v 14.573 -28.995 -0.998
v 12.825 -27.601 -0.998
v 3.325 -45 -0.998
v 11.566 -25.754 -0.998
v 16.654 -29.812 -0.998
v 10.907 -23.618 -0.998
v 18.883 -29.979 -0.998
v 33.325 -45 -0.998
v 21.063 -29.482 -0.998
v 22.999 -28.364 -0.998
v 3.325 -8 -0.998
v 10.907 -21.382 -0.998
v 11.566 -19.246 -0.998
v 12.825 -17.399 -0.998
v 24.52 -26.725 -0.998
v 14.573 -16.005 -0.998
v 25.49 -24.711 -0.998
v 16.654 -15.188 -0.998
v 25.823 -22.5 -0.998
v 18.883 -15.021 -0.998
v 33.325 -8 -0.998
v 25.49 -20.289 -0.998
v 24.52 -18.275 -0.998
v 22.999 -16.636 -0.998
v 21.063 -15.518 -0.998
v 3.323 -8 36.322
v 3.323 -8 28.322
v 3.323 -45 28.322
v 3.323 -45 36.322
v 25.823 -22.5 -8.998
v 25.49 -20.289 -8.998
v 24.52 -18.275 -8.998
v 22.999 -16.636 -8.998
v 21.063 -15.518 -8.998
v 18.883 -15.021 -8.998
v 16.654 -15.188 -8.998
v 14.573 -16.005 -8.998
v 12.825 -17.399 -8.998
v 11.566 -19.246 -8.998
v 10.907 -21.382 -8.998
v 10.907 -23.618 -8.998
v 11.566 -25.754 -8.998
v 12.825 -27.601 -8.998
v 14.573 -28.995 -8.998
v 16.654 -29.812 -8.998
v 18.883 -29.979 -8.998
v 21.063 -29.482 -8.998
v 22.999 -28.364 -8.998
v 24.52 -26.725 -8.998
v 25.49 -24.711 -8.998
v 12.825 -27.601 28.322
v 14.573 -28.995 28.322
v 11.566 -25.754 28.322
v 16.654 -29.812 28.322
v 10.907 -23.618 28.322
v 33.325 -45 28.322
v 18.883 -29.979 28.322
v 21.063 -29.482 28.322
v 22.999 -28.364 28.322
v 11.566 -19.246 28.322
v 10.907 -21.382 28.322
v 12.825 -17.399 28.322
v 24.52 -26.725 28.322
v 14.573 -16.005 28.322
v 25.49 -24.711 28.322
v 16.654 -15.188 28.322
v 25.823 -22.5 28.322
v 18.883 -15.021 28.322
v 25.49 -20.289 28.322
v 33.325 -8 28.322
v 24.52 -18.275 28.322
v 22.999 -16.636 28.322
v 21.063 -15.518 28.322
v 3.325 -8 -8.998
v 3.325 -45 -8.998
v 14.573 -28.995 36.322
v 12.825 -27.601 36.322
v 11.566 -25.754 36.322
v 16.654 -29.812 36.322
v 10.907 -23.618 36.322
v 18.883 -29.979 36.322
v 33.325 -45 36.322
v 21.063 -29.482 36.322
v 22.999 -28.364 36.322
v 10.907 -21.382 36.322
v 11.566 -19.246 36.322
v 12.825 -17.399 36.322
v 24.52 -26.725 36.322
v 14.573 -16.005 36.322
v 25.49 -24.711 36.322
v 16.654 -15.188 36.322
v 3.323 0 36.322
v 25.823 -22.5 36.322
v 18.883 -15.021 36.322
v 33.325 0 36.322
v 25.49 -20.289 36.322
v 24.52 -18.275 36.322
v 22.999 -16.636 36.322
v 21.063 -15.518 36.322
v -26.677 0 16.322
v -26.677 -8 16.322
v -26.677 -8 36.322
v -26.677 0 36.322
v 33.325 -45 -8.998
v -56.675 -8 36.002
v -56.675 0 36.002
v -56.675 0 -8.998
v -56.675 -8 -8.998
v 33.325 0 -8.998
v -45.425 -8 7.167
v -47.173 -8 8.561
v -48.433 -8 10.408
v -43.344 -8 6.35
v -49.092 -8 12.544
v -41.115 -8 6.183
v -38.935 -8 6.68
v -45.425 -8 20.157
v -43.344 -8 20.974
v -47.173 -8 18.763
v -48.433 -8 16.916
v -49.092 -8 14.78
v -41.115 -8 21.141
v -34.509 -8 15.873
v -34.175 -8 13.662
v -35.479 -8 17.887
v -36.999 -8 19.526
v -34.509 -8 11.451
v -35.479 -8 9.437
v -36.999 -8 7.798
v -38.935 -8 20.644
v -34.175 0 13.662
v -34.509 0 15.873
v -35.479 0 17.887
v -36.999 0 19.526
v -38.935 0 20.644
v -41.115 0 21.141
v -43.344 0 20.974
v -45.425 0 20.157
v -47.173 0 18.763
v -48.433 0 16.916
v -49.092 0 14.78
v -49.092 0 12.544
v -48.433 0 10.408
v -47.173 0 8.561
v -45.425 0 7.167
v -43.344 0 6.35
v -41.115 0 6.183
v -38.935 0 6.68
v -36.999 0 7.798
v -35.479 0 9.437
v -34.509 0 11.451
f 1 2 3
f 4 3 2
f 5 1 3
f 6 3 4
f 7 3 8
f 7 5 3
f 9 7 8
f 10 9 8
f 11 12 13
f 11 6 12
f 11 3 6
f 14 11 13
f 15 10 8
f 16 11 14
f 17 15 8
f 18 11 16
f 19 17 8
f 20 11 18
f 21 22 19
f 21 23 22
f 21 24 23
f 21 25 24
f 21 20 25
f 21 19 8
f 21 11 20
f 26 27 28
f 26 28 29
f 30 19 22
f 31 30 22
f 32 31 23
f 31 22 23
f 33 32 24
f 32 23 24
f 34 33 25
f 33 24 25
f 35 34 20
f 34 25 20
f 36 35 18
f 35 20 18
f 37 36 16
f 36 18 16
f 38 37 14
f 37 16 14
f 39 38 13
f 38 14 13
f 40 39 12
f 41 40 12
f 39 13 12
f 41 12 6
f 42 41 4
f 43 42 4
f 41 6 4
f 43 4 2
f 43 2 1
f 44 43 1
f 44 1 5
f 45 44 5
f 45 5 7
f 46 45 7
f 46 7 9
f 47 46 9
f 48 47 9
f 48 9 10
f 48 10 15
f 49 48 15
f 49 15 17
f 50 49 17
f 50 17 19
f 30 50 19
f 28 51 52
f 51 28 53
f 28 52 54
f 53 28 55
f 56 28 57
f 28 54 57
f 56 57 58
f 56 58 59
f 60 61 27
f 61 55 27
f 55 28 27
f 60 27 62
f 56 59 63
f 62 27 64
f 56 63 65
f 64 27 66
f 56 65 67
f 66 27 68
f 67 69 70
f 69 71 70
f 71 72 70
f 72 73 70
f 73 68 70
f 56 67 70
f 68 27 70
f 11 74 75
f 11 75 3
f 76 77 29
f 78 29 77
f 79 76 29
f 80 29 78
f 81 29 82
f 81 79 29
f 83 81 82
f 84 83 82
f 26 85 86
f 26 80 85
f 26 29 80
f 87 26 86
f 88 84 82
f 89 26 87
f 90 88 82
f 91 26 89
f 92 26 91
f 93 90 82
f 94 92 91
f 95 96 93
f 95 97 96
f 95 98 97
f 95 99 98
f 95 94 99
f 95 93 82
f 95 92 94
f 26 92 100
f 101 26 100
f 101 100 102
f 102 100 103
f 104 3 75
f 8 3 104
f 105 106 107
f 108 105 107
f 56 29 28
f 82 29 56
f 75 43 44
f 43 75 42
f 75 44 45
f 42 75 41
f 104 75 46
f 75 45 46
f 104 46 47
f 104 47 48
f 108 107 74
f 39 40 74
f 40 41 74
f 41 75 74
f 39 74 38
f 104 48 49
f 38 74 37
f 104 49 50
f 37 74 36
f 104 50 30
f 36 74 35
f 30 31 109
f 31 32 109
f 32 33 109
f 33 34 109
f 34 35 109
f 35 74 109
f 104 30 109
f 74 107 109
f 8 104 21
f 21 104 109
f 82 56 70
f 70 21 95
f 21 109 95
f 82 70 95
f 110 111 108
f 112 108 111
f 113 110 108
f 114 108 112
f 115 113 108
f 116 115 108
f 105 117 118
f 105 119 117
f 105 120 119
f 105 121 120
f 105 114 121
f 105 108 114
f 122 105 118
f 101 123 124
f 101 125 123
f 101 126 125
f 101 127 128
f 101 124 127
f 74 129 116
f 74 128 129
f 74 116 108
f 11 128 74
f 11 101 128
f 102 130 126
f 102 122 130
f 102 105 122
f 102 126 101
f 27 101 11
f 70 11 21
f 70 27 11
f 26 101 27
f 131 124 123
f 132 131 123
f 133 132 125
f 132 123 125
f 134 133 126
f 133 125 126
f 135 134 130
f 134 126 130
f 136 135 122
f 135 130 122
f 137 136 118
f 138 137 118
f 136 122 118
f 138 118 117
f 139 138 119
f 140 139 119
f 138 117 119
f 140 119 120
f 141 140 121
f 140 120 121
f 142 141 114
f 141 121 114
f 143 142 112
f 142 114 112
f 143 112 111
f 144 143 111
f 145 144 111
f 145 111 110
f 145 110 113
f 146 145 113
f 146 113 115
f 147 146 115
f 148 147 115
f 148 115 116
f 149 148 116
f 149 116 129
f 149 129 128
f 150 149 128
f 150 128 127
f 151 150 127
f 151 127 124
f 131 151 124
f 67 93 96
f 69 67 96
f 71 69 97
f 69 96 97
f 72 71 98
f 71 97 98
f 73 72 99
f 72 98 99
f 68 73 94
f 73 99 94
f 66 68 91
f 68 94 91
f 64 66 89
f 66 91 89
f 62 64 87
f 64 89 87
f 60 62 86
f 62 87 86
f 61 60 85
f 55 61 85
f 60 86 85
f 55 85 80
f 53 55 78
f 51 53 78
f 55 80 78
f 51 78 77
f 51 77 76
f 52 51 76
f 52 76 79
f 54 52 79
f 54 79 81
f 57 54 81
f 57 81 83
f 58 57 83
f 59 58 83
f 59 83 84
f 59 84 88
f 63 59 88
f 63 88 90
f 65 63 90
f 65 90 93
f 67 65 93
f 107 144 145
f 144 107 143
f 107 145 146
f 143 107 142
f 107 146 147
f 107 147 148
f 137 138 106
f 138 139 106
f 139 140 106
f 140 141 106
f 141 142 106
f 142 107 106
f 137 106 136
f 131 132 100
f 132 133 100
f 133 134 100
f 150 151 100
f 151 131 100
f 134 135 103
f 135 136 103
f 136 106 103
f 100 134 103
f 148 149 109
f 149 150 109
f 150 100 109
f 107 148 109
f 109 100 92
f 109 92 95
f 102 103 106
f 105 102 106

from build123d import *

# Parameters (mm, degrees)
F1_DEPTH = 8
F2_W     = 30
F2_H     = 8
F3_DEPTH = 37
F4_W     = 30.001698
F4_H     = 8
F5_DEPTH = 37
F6_R     = 7.5
F7_DEPTH = 81.026
F8_R     = 7.5
F9_DEPTH = 57.15


with BuildPart() as f1:
    # F0 (on Front) → F1 (new body)
    with BuildSketch(Plane.XZ):
        Polygon((-26.677133, 36.321553), (-56.675435, 36.002424), (-56.675435, -8.997576), (33.324565, -8.997576), (33.324565, 36.321553), (3.322867, 36.321553), (-26.677133, 16.321553), align=None)
    extrude(amount=F1_DEPTH)

    # F2 (on face) → F3 (join)
    with BuildSketch(Plane.XZ.offset(8)):
        with Locations((18.324565, -4.997576)):
            Rectangle(F2_W, F2_H)
    extrude(amount=F3_DEPTH)

    # F4 (on face) → F5 (join)
    with BuildSketch(Plane.XZ.offset(8)):
        with Locations((18.323716, 32.321553)):
            Rectangle(F4_W, F4_H)
    extrude(amount=F5_DEPTH)

    # F6 (on face) → F7 (cut)
    with BuildSketch(Plane.XY.offset(36.321553)):
        with Locations((18.322867, -22.5)):
            Circle(F6_R)
    extrude(amount=-F7_DEPTH, mode=Mode.SUBTRACT)

    # F8 (on face) → F9 (cut)
    with BuildSketch(Plane.XZ.offset(8)):
        with Locations((-41.675435, 13.661989)):
            Circle(F8_R)
    extrude(amount=-F9_DEPTH, mode=Mode.SUBTRACT)


solid = f1.part
